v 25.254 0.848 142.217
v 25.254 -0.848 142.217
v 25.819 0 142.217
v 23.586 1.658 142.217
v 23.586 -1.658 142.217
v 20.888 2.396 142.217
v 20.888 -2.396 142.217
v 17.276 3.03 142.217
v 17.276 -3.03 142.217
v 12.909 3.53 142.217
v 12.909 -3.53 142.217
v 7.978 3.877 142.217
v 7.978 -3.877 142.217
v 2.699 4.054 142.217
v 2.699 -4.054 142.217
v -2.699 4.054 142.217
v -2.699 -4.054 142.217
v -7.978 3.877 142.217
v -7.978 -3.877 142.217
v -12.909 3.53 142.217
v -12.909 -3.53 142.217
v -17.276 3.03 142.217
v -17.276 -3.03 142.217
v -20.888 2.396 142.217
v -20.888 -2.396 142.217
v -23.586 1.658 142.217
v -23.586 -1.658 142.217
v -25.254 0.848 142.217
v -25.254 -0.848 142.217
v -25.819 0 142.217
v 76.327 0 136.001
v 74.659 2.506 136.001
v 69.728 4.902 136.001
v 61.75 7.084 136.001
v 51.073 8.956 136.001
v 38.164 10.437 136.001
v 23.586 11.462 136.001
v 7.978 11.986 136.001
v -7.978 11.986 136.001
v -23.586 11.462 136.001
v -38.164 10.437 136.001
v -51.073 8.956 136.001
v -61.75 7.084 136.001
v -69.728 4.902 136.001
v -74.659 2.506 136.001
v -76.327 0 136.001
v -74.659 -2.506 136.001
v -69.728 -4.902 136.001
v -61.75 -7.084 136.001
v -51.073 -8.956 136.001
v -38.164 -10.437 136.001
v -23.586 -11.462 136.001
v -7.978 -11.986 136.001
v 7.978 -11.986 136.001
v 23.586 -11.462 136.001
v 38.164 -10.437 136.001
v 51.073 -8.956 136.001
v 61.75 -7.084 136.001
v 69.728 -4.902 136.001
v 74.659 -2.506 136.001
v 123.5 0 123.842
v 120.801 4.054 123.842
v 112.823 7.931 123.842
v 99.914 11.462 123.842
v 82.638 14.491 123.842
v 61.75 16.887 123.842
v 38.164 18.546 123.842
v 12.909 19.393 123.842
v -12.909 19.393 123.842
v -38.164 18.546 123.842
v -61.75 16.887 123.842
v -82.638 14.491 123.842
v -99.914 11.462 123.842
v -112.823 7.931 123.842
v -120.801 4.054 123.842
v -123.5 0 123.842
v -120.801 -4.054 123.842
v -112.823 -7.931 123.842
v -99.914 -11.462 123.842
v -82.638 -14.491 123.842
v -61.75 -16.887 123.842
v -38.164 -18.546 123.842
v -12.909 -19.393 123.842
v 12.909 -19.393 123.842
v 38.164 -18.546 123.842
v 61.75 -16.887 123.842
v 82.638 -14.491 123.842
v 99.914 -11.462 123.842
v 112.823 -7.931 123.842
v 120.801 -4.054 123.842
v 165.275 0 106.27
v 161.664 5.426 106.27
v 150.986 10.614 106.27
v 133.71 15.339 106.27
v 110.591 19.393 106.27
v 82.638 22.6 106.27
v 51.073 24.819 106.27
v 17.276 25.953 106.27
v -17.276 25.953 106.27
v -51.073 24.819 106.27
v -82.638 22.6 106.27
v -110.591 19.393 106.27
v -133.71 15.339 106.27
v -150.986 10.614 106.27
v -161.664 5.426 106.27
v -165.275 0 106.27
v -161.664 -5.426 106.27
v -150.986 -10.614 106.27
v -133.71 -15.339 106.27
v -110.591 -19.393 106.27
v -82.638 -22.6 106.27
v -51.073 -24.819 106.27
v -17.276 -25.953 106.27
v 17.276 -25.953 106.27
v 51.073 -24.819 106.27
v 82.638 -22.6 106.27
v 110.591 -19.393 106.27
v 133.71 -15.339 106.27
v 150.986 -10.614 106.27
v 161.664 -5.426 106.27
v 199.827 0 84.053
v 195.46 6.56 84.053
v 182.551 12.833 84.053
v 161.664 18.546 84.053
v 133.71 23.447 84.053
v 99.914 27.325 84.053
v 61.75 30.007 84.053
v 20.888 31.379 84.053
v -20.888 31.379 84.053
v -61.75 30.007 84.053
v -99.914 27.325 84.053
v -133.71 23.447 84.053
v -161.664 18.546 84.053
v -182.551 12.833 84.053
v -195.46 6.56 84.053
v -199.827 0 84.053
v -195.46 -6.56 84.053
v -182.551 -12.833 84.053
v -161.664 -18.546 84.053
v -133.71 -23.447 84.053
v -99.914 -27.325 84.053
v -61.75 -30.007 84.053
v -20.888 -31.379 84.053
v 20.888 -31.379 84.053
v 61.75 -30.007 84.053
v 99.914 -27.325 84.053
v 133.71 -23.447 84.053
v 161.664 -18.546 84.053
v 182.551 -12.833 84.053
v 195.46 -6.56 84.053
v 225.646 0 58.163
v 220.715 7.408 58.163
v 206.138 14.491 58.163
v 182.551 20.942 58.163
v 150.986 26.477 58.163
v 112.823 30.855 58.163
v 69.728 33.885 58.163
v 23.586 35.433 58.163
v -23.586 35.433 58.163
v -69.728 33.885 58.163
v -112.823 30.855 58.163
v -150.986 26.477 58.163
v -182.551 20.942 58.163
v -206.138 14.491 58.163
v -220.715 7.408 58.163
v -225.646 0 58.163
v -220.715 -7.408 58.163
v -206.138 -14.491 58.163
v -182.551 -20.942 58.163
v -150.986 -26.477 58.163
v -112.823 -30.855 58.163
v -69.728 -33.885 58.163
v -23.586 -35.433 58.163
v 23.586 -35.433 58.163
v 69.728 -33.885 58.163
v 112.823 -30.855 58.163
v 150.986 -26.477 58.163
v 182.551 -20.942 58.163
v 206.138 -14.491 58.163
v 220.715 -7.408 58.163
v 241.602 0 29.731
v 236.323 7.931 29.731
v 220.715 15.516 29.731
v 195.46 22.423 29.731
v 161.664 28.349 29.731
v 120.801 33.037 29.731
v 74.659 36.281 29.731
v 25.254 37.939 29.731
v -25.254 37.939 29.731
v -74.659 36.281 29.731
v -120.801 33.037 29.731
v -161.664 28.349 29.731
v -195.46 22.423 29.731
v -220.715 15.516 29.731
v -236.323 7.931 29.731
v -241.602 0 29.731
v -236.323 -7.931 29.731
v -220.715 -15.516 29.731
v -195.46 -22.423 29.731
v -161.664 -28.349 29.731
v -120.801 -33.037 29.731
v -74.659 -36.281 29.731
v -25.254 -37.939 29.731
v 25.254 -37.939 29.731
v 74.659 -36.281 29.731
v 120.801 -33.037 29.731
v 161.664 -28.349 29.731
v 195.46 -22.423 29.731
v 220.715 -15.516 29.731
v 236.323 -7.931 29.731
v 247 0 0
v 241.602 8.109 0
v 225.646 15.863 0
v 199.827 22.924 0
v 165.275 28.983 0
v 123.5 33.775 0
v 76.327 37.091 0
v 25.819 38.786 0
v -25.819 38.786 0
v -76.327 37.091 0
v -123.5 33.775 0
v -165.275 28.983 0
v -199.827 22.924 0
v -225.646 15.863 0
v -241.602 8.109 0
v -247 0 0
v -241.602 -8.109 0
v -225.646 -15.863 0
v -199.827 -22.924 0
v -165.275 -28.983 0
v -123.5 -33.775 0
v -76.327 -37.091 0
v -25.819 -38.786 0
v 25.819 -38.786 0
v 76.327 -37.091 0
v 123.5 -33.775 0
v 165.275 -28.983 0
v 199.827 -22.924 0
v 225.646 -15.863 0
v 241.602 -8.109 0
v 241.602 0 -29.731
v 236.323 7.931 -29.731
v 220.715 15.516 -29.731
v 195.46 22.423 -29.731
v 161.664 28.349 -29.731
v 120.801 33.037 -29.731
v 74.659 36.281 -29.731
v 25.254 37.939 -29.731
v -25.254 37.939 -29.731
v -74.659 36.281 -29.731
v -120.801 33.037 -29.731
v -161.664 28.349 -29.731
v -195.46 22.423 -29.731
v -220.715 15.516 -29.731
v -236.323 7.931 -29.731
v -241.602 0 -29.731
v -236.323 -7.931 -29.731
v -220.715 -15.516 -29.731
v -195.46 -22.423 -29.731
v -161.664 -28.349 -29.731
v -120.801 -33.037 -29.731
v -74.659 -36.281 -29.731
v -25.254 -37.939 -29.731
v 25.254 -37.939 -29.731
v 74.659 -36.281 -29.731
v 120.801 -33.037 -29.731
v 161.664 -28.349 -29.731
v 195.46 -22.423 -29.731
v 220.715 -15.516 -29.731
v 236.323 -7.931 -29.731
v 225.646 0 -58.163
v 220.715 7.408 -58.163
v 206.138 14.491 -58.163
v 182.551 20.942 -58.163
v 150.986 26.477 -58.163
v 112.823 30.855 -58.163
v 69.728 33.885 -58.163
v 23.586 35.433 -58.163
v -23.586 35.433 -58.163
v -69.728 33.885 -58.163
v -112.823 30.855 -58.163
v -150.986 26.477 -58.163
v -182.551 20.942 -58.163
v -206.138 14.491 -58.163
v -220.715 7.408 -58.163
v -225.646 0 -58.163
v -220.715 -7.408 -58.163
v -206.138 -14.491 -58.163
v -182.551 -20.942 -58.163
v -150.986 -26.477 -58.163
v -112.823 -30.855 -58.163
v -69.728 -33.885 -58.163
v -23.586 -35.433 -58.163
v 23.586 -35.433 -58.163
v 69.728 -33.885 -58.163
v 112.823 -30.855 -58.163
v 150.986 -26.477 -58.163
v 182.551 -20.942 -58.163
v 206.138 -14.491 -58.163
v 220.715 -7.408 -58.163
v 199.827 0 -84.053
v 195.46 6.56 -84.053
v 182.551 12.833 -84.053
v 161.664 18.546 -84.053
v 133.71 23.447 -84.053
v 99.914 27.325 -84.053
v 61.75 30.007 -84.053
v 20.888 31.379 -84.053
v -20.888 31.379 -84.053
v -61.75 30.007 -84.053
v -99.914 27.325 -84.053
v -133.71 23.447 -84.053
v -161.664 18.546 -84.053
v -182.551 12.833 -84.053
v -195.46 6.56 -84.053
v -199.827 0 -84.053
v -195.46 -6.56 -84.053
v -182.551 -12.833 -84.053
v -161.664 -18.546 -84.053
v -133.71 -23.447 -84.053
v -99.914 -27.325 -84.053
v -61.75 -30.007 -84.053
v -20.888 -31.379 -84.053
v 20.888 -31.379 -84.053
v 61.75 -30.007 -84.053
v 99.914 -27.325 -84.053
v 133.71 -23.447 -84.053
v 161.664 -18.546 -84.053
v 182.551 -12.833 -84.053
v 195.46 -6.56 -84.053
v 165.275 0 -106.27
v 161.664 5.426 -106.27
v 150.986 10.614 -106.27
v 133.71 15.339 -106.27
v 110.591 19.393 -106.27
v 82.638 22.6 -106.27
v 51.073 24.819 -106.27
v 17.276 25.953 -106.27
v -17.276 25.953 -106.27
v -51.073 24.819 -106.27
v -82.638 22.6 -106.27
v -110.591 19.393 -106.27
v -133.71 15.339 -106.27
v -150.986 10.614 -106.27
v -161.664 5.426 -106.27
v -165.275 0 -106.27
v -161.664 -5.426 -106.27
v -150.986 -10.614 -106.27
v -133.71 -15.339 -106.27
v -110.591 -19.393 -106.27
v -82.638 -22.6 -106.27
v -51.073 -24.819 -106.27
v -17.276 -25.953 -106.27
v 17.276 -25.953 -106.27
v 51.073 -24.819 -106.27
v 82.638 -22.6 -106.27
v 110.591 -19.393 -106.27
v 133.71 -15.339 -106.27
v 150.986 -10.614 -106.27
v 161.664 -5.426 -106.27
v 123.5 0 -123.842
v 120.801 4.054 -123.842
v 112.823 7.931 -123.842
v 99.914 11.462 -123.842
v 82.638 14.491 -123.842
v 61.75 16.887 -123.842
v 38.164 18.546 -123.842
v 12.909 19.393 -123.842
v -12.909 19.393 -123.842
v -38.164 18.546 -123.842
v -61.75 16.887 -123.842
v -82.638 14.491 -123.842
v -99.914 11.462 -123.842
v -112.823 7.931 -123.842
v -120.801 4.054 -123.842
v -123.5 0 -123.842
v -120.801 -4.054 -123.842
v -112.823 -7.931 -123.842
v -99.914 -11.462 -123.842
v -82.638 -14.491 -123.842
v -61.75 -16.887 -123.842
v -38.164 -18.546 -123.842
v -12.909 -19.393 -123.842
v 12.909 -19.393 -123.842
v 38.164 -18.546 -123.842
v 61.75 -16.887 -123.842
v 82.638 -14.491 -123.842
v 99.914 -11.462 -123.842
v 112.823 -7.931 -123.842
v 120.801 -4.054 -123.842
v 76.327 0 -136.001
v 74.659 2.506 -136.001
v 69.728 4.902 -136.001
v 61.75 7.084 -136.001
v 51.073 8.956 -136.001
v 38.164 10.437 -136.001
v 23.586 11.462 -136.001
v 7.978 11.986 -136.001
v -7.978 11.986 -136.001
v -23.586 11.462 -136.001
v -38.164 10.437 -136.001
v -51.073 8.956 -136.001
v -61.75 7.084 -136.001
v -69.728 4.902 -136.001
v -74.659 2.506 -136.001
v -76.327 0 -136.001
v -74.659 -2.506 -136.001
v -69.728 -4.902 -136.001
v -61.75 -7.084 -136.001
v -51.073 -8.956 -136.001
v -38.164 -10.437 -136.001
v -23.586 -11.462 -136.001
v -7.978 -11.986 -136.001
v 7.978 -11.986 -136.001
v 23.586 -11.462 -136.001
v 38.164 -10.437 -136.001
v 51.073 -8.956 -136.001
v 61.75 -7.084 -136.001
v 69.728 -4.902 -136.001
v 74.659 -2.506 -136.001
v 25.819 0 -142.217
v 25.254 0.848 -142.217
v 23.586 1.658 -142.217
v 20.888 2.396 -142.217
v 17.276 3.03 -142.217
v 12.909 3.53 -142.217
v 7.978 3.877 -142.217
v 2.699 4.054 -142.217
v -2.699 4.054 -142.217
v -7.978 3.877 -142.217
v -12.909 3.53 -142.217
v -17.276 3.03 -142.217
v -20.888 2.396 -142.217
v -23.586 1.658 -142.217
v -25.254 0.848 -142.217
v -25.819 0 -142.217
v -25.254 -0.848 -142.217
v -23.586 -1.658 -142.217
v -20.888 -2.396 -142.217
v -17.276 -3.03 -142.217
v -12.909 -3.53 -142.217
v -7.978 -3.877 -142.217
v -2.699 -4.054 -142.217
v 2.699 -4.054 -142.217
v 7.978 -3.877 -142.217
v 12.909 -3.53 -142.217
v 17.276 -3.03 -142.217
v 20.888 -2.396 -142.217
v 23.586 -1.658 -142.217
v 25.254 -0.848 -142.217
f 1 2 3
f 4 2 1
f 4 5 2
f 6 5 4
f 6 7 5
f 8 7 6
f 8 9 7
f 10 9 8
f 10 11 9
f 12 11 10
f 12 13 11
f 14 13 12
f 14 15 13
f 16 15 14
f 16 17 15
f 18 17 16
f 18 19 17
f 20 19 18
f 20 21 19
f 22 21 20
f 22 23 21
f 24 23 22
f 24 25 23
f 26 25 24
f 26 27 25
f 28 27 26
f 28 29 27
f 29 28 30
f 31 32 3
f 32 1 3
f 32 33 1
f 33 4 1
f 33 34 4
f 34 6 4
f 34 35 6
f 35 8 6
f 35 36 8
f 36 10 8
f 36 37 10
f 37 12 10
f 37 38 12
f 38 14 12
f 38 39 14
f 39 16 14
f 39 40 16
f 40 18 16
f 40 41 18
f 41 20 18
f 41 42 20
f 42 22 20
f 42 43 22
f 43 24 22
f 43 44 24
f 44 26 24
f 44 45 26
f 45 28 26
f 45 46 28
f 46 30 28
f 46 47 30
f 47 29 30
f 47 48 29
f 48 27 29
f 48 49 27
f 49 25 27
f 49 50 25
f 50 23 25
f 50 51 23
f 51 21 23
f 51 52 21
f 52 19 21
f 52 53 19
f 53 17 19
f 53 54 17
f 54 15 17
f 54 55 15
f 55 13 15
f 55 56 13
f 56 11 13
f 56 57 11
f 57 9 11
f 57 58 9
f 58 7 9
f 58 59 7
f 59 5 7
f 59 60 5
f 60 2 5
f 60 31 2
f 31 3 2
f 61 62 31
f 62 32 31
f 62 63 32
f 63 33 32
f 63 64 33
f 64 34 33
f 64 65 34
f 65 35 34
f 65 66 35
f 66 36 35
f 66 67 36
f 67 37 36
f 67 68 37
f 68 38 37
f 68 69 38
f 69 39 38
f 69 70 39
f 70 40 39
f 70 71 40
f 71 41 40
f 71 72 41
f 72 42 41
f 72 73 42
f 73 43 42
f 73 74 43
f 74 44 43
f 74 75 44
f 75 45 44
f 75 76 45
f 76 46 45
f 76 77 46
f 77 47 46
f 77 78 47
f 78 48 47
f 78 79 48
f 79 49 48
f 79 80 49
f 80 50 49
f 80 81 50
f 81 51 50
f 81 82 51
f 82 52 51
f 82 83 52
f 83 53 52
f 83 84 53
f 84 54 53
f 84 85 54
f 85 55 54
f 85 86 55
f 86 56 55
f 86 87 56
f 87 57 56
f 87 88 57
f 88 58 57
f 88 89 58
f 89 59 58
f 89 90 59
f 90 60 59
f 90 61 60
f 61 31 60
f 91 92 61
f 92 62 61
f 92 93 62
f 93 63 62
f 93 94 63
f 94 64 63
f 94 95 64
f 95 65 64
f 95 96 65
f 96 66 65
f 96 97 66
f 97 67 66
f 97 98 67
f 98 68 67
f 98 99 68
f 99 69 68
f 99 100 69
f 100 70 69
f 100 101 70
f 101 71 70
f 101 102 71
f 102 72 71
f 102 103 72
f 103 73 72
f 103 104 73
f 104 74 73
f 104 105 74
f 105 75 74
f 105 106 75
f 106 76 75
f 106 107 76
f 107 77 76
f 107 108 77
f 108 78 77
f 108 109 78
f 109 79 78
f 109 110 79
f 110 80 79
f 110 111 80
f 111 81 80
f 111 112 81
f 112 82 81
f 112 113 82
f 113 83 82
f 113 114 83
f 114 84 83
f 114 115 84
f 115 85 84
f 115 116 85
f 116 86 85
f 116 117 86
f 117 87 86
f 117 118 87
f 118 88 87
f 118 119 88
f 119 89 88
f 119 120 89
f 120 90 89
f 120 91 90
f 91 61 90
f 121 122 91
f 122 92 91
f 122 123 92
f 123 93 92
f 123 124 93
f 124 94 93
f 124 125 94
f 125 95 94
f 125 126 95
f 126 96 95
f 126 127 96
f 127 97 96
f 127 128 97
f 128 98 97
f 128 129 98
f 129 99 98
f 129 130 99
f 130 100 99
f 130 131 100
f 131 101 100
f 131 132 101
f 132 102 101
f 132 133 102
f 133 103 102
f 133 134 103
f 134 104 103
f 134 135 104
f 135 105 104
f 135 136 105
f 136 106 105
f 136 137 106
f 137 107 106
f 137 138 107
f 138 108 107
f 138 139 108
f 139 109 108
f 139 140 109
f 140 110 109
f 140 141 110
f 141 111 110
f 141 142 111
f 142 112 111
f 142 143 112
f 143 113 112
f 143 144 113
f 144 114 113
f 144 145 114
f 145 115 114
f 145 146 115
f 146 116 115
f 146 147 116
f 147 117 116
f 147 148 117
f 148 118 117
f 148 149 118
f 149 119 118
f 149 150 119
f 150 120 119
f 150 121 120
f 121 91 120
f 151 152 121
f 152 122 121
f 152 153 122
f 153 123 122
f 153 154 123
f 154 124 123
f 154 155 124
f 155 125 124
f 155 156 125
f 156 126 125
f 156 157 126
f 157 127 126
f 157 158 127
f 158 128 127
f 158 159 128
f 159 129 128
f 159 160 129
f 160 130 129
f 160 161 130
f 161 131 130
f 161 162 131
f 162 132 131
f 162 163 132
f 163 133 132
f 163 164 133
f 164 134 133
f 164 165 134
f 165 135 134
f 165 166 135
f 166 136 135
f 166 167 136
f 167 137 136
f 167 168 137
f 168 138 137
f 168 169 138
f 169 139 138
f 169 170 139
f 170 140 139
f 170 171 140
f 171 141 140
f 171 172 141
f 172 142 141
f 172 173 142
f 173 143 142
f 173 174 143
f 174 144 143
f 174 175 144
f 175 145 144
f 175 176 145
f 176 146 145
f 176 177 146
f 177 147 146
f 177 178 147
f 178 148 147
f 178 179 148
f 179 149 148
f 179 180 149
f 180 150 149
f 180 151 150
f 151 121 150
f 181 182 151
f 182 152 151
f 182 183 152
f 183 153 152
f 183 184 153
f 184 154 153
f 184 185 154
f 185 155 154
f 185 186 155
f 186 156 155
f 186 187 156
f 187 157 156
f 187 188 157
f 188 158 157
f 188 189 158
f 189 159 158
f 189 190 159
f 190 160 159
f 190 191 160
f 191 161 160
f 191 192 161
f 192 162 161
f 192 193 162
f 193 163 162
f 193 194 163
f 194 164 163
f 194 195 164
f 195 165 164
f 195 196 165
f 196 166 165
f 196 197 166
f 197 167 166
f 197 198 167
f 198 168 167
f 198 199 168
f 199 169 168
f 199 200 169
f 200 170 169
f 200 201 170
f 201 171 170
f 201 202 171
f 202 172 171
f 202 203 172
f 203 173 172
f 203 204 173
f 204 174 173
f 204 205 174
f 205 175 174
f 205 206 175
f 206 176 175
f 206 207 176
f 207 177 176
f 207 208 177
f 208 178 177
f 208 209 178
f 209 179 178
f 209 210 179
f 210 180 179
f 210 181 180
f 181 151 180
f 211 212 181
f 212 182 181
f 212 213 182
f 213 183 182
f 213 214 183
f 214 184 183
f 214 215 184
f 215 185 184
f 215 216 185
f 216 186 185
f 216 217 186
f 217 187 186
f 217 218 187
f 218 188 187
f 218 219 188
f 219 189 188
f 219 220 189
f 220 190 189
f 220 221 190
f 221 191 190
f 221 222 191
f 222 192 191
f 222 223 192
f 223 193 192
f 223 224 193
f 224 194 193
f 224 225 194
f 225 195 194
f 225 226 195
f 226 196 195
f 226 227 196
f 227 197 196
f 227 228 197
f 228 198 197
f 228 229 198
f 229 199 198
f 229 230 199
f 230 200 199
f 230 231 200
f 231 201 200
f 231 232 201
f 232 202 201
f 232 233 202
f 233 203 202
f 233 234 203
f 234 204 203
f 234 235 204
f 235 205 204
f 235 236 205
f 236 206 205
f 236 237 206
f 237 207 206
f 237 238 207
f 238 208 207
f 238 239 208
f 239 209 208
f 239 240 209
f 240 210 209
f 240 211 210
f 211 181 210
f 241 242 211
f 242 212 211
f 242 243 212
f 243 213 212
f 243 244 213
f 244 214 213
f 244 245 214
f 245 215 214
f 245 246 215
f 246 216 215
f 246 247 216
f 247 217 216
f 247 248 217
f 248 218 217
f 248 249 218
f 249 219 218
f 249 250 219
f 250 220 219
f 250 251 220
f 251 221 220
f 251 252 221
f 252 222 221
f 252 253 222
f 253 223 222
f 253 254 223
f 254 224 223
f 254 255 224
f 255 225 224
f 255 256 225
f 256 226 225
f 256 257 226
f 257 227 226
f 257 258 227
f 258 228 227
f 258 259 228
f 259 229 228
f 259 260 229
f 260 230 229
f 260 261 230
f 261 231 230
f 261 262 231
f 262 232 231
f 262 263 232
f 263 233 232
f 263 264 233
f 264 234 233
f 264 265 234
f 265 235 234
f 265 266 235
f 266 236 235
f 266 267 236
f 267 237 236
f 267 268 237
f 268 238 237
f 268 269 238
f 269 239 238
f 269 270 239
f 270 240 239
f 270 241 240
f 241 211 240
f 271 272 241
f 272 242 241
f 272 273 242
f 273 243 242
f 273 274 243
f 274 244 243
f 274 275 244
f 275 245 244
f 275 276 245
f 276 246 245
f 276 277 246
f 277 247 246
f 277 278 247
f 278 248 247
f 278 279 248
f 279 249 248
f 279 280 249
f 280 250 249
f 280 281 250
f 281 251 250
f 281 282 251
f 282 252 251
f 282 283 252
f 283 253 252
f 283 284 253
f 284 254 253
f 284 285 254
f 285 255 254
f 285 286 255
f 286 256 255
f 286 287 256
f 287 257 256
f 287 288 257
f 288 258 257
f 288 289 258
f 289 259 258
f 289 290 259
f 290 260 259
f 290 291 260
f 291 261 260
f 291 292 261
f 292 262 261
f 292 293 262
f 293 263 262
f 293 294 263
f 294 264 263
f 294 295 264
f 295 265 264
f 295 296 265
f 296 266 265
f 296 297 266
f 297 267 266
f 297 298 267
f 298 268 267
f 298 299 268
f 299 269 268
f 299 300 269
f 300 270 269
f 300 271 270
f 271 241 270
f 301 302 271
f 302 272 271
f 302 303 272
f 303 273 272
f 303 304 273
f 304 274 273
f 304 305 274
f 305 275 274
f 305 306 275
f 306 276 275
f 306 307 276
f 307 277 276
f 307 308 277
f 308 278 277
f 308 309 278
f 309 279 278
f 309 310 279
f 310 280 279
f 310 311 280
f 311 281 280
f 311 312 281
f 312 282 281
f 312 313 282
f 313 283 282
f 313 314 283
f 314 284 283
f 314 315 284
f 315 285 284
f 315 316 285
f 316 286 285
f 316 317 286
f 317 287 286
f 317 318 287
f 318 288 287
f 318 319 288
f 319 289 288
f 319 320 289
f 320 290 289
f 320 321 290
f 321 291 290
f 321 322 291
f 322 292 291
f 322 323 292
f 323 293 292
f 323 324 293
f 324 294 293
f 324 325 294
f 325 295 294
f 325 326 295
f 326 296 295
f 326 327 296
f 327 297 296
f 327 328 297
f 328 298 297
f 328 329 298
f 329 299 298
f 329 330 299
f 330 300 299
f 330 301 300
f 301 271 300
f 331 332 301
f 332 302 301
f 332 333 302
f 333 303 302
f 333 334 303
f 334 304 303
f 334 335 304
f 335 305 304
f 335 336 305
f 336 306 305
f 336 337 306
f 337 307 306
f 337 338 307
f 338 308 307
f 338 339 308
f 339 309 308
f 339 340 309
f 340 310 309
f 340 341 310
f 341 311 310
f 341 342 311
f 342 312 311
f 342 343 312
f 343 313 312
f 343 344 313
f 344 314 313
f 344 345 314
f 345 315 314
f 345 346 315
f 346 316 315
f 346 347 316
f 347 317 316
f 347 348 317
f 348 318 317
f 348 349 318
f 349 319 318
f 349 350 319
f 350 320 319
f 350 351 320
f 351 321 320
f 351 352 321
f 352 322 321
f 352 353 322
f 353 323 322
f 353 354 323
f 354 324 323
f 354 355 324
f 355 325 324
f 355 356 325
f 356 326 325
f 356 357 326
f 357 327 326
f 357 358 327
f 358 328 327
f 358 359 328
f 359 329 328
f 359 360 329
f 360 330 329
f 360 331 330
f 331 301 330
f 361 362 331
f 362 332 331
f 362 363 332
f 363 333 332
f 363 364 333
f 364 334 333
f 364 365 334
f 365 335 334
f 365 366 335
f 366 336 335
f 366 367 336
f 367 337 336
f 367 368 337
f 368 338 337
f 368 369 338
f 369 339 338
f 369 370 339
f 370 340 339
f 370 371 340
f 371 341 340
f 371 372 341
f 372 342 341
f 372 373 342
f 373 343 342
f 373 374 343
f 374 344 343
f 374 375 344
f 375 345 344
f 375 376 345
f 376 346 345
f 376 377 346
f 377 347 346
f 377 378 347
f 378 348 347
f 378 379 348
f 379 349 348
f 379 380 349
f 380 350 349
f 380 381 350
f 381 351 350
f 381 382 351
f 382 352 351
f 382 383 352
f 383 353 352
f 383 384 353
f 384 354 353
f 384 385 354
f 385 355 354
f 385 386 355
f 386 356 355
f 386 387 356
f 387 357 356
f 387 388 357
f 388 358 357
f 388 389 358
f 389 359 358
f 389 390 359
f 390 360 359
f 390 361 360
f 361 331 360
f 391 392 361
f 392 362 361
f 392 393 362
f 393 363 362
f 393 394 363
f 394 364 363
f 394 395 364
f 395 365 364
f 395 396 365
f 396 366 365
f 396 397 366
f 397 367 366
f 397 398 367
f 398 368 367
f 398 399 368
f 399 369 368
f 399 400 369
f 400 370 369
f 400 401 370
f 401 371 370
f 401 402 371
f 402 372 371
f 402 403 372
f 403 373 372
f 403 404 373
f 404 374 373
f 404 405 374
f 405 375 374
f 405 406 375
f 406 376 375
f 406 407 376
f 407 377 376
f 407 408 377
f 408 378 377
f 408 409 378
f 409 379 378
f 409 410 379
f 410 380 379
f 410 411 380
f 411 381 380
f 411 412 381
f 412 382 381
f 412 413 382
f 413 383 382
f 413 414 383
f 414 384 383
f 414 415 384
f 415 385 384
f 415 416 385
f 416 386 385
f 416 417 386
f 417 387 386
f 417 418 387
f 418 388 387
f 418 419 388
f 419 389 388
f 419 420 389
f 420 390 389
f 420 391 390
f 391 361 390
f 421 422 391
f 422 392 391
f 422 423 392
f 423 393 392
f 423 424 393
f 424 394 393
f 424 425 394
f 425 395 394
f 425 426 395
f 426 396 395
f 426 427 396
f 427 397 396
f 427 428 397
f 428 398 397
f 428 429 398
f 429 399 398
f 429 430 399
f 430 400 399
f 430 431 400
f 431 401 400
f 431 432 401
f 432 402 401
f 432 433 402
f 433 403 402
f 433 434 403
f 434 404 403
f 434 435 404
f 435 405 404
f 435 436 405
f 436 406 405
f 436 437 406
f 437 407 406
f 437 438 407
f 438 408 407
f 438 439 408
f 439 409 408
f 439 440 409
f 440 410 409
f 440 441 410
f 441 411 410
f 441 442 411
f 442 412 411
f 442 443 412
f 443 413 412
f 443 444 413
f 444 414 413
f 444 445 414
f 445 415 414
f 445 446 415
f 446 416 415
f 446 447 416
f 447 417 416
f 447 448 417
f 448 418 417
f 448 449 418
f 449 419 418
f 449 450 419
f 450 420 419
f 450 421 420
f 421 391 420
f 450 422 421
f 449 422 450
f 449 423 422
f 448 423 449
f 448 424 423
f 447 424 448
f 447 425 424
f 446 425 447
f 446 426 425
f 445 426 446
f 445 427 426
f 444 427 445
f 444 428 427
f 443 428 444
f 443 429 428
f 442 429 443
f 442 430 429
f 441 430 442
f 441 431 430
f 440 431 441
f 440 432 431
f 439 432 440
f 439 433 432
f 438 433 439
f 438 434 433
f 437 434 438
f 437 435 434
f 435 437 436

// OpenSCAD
// Generated by SolidPython 1.0.1 on 2020-07-29 00:46:53


scale(v = [19, 3, 11]) {
	sphere(r = 13);
}
/***********************************************
*********      SolidPython code:      **********
************************************************
 
# import packages: SolidPython
from solid import *
from solid.utils import *
from itertools import chain, combinations, permutations


class Resize:

    def __init__(self, scad_file):
        self.scad_file = scad_file
        #self.scad_file = import_scad(scad_file)
        # cone/cylinder param:
        self.r1 = 0
        self.r2 = 0
        self.h = 0
        # rectangular prism param:
        self.w = 0
        self.l = 0
        # ellipse param:
        self.r = 0

    # import OpenScad code (file name corresponds to shape)


    # classify shape + parameters
    def assign(self, param1, param2, param3):
        if self.scad_file == 'cone.scad':
            self.r1 = param1
            self.r2 = param2
            self.h = param3
        elif self.scad_file == 'cylinder.scad':
            self.r1 = param1
            self.r2 = param2
            self.h = param3
        elif self.scad_file == 'rectangularPrism.scad':
            self.h = param1
            self.l = param2
            self.w = param3
        else:
            self.r = param1
            self.h = param2

    # resize parameters
    def iterate(self):
        x = range(3, 20, 2)
        i = 1
        if self.scad_file == 'cone.scad':
            tempList = list(permutations(x, 2))
            for temp in tempList:
                param1 = temp[0]
                param2 = temp[1]
                filepath = 'produced_scad_files/' + 'cone' + str(param1) + '_' + str(param2) + '_' + '.scad'
                scad_render_to_file(cylinder(h=param1, r1=param2, r2=0), filepath)

        elif self.scad_file == 'cylinder.scad':
            tempList = list(permutations(x, 3))
            for temp in tempList:
                param1 = temp[0]
                param2 = temp[1]
                filepath = 'produced_scad_files/' + 'cylinder' + str(param1) + '_' + str(param2) + '_' + '.scad'
                scad_render_to_file(cylinder(h=param1, r1=param2, r2=param2), filepath)

        elif self.scad_file == 'rectangularPrism.scad':
            tempList = list(permutations(x, 3))
            for temp in tempList:
                param1 = temp[0]
                param2 = temp[1]
                param3 = temp[2]
                filepath = 'produced_scad_files/' + 'rectangularPrism' + str(param1) + '_' + str(param2) + '_' + str(
                    param3) + '.scad'
                scad_render_to_file(cube(size=(param1, param2, param3)), filepath)

        elif self.scad_file == 'ellipse.scad':
            tempList = list(permutations(x, 4))
            for temp in tempList:
                param1 = temp[0]
                param2 = temp[1]
                param3 = temp[2]
                param4 = temp[3]
                filepath = 'produced_scad_files/' + 'ellipse' + str(param1) + '_' + str(param2) + '_' + str(param3) + '_' + str(param4) + '.scad'
                scad_render_to_file(scale([param1, param2, param3])(sphere(r=param4)), filepath)

    def render_to_scadfile(self):
        scad_render_to_file(scad, 'example.scad') 
 
************************************************/
